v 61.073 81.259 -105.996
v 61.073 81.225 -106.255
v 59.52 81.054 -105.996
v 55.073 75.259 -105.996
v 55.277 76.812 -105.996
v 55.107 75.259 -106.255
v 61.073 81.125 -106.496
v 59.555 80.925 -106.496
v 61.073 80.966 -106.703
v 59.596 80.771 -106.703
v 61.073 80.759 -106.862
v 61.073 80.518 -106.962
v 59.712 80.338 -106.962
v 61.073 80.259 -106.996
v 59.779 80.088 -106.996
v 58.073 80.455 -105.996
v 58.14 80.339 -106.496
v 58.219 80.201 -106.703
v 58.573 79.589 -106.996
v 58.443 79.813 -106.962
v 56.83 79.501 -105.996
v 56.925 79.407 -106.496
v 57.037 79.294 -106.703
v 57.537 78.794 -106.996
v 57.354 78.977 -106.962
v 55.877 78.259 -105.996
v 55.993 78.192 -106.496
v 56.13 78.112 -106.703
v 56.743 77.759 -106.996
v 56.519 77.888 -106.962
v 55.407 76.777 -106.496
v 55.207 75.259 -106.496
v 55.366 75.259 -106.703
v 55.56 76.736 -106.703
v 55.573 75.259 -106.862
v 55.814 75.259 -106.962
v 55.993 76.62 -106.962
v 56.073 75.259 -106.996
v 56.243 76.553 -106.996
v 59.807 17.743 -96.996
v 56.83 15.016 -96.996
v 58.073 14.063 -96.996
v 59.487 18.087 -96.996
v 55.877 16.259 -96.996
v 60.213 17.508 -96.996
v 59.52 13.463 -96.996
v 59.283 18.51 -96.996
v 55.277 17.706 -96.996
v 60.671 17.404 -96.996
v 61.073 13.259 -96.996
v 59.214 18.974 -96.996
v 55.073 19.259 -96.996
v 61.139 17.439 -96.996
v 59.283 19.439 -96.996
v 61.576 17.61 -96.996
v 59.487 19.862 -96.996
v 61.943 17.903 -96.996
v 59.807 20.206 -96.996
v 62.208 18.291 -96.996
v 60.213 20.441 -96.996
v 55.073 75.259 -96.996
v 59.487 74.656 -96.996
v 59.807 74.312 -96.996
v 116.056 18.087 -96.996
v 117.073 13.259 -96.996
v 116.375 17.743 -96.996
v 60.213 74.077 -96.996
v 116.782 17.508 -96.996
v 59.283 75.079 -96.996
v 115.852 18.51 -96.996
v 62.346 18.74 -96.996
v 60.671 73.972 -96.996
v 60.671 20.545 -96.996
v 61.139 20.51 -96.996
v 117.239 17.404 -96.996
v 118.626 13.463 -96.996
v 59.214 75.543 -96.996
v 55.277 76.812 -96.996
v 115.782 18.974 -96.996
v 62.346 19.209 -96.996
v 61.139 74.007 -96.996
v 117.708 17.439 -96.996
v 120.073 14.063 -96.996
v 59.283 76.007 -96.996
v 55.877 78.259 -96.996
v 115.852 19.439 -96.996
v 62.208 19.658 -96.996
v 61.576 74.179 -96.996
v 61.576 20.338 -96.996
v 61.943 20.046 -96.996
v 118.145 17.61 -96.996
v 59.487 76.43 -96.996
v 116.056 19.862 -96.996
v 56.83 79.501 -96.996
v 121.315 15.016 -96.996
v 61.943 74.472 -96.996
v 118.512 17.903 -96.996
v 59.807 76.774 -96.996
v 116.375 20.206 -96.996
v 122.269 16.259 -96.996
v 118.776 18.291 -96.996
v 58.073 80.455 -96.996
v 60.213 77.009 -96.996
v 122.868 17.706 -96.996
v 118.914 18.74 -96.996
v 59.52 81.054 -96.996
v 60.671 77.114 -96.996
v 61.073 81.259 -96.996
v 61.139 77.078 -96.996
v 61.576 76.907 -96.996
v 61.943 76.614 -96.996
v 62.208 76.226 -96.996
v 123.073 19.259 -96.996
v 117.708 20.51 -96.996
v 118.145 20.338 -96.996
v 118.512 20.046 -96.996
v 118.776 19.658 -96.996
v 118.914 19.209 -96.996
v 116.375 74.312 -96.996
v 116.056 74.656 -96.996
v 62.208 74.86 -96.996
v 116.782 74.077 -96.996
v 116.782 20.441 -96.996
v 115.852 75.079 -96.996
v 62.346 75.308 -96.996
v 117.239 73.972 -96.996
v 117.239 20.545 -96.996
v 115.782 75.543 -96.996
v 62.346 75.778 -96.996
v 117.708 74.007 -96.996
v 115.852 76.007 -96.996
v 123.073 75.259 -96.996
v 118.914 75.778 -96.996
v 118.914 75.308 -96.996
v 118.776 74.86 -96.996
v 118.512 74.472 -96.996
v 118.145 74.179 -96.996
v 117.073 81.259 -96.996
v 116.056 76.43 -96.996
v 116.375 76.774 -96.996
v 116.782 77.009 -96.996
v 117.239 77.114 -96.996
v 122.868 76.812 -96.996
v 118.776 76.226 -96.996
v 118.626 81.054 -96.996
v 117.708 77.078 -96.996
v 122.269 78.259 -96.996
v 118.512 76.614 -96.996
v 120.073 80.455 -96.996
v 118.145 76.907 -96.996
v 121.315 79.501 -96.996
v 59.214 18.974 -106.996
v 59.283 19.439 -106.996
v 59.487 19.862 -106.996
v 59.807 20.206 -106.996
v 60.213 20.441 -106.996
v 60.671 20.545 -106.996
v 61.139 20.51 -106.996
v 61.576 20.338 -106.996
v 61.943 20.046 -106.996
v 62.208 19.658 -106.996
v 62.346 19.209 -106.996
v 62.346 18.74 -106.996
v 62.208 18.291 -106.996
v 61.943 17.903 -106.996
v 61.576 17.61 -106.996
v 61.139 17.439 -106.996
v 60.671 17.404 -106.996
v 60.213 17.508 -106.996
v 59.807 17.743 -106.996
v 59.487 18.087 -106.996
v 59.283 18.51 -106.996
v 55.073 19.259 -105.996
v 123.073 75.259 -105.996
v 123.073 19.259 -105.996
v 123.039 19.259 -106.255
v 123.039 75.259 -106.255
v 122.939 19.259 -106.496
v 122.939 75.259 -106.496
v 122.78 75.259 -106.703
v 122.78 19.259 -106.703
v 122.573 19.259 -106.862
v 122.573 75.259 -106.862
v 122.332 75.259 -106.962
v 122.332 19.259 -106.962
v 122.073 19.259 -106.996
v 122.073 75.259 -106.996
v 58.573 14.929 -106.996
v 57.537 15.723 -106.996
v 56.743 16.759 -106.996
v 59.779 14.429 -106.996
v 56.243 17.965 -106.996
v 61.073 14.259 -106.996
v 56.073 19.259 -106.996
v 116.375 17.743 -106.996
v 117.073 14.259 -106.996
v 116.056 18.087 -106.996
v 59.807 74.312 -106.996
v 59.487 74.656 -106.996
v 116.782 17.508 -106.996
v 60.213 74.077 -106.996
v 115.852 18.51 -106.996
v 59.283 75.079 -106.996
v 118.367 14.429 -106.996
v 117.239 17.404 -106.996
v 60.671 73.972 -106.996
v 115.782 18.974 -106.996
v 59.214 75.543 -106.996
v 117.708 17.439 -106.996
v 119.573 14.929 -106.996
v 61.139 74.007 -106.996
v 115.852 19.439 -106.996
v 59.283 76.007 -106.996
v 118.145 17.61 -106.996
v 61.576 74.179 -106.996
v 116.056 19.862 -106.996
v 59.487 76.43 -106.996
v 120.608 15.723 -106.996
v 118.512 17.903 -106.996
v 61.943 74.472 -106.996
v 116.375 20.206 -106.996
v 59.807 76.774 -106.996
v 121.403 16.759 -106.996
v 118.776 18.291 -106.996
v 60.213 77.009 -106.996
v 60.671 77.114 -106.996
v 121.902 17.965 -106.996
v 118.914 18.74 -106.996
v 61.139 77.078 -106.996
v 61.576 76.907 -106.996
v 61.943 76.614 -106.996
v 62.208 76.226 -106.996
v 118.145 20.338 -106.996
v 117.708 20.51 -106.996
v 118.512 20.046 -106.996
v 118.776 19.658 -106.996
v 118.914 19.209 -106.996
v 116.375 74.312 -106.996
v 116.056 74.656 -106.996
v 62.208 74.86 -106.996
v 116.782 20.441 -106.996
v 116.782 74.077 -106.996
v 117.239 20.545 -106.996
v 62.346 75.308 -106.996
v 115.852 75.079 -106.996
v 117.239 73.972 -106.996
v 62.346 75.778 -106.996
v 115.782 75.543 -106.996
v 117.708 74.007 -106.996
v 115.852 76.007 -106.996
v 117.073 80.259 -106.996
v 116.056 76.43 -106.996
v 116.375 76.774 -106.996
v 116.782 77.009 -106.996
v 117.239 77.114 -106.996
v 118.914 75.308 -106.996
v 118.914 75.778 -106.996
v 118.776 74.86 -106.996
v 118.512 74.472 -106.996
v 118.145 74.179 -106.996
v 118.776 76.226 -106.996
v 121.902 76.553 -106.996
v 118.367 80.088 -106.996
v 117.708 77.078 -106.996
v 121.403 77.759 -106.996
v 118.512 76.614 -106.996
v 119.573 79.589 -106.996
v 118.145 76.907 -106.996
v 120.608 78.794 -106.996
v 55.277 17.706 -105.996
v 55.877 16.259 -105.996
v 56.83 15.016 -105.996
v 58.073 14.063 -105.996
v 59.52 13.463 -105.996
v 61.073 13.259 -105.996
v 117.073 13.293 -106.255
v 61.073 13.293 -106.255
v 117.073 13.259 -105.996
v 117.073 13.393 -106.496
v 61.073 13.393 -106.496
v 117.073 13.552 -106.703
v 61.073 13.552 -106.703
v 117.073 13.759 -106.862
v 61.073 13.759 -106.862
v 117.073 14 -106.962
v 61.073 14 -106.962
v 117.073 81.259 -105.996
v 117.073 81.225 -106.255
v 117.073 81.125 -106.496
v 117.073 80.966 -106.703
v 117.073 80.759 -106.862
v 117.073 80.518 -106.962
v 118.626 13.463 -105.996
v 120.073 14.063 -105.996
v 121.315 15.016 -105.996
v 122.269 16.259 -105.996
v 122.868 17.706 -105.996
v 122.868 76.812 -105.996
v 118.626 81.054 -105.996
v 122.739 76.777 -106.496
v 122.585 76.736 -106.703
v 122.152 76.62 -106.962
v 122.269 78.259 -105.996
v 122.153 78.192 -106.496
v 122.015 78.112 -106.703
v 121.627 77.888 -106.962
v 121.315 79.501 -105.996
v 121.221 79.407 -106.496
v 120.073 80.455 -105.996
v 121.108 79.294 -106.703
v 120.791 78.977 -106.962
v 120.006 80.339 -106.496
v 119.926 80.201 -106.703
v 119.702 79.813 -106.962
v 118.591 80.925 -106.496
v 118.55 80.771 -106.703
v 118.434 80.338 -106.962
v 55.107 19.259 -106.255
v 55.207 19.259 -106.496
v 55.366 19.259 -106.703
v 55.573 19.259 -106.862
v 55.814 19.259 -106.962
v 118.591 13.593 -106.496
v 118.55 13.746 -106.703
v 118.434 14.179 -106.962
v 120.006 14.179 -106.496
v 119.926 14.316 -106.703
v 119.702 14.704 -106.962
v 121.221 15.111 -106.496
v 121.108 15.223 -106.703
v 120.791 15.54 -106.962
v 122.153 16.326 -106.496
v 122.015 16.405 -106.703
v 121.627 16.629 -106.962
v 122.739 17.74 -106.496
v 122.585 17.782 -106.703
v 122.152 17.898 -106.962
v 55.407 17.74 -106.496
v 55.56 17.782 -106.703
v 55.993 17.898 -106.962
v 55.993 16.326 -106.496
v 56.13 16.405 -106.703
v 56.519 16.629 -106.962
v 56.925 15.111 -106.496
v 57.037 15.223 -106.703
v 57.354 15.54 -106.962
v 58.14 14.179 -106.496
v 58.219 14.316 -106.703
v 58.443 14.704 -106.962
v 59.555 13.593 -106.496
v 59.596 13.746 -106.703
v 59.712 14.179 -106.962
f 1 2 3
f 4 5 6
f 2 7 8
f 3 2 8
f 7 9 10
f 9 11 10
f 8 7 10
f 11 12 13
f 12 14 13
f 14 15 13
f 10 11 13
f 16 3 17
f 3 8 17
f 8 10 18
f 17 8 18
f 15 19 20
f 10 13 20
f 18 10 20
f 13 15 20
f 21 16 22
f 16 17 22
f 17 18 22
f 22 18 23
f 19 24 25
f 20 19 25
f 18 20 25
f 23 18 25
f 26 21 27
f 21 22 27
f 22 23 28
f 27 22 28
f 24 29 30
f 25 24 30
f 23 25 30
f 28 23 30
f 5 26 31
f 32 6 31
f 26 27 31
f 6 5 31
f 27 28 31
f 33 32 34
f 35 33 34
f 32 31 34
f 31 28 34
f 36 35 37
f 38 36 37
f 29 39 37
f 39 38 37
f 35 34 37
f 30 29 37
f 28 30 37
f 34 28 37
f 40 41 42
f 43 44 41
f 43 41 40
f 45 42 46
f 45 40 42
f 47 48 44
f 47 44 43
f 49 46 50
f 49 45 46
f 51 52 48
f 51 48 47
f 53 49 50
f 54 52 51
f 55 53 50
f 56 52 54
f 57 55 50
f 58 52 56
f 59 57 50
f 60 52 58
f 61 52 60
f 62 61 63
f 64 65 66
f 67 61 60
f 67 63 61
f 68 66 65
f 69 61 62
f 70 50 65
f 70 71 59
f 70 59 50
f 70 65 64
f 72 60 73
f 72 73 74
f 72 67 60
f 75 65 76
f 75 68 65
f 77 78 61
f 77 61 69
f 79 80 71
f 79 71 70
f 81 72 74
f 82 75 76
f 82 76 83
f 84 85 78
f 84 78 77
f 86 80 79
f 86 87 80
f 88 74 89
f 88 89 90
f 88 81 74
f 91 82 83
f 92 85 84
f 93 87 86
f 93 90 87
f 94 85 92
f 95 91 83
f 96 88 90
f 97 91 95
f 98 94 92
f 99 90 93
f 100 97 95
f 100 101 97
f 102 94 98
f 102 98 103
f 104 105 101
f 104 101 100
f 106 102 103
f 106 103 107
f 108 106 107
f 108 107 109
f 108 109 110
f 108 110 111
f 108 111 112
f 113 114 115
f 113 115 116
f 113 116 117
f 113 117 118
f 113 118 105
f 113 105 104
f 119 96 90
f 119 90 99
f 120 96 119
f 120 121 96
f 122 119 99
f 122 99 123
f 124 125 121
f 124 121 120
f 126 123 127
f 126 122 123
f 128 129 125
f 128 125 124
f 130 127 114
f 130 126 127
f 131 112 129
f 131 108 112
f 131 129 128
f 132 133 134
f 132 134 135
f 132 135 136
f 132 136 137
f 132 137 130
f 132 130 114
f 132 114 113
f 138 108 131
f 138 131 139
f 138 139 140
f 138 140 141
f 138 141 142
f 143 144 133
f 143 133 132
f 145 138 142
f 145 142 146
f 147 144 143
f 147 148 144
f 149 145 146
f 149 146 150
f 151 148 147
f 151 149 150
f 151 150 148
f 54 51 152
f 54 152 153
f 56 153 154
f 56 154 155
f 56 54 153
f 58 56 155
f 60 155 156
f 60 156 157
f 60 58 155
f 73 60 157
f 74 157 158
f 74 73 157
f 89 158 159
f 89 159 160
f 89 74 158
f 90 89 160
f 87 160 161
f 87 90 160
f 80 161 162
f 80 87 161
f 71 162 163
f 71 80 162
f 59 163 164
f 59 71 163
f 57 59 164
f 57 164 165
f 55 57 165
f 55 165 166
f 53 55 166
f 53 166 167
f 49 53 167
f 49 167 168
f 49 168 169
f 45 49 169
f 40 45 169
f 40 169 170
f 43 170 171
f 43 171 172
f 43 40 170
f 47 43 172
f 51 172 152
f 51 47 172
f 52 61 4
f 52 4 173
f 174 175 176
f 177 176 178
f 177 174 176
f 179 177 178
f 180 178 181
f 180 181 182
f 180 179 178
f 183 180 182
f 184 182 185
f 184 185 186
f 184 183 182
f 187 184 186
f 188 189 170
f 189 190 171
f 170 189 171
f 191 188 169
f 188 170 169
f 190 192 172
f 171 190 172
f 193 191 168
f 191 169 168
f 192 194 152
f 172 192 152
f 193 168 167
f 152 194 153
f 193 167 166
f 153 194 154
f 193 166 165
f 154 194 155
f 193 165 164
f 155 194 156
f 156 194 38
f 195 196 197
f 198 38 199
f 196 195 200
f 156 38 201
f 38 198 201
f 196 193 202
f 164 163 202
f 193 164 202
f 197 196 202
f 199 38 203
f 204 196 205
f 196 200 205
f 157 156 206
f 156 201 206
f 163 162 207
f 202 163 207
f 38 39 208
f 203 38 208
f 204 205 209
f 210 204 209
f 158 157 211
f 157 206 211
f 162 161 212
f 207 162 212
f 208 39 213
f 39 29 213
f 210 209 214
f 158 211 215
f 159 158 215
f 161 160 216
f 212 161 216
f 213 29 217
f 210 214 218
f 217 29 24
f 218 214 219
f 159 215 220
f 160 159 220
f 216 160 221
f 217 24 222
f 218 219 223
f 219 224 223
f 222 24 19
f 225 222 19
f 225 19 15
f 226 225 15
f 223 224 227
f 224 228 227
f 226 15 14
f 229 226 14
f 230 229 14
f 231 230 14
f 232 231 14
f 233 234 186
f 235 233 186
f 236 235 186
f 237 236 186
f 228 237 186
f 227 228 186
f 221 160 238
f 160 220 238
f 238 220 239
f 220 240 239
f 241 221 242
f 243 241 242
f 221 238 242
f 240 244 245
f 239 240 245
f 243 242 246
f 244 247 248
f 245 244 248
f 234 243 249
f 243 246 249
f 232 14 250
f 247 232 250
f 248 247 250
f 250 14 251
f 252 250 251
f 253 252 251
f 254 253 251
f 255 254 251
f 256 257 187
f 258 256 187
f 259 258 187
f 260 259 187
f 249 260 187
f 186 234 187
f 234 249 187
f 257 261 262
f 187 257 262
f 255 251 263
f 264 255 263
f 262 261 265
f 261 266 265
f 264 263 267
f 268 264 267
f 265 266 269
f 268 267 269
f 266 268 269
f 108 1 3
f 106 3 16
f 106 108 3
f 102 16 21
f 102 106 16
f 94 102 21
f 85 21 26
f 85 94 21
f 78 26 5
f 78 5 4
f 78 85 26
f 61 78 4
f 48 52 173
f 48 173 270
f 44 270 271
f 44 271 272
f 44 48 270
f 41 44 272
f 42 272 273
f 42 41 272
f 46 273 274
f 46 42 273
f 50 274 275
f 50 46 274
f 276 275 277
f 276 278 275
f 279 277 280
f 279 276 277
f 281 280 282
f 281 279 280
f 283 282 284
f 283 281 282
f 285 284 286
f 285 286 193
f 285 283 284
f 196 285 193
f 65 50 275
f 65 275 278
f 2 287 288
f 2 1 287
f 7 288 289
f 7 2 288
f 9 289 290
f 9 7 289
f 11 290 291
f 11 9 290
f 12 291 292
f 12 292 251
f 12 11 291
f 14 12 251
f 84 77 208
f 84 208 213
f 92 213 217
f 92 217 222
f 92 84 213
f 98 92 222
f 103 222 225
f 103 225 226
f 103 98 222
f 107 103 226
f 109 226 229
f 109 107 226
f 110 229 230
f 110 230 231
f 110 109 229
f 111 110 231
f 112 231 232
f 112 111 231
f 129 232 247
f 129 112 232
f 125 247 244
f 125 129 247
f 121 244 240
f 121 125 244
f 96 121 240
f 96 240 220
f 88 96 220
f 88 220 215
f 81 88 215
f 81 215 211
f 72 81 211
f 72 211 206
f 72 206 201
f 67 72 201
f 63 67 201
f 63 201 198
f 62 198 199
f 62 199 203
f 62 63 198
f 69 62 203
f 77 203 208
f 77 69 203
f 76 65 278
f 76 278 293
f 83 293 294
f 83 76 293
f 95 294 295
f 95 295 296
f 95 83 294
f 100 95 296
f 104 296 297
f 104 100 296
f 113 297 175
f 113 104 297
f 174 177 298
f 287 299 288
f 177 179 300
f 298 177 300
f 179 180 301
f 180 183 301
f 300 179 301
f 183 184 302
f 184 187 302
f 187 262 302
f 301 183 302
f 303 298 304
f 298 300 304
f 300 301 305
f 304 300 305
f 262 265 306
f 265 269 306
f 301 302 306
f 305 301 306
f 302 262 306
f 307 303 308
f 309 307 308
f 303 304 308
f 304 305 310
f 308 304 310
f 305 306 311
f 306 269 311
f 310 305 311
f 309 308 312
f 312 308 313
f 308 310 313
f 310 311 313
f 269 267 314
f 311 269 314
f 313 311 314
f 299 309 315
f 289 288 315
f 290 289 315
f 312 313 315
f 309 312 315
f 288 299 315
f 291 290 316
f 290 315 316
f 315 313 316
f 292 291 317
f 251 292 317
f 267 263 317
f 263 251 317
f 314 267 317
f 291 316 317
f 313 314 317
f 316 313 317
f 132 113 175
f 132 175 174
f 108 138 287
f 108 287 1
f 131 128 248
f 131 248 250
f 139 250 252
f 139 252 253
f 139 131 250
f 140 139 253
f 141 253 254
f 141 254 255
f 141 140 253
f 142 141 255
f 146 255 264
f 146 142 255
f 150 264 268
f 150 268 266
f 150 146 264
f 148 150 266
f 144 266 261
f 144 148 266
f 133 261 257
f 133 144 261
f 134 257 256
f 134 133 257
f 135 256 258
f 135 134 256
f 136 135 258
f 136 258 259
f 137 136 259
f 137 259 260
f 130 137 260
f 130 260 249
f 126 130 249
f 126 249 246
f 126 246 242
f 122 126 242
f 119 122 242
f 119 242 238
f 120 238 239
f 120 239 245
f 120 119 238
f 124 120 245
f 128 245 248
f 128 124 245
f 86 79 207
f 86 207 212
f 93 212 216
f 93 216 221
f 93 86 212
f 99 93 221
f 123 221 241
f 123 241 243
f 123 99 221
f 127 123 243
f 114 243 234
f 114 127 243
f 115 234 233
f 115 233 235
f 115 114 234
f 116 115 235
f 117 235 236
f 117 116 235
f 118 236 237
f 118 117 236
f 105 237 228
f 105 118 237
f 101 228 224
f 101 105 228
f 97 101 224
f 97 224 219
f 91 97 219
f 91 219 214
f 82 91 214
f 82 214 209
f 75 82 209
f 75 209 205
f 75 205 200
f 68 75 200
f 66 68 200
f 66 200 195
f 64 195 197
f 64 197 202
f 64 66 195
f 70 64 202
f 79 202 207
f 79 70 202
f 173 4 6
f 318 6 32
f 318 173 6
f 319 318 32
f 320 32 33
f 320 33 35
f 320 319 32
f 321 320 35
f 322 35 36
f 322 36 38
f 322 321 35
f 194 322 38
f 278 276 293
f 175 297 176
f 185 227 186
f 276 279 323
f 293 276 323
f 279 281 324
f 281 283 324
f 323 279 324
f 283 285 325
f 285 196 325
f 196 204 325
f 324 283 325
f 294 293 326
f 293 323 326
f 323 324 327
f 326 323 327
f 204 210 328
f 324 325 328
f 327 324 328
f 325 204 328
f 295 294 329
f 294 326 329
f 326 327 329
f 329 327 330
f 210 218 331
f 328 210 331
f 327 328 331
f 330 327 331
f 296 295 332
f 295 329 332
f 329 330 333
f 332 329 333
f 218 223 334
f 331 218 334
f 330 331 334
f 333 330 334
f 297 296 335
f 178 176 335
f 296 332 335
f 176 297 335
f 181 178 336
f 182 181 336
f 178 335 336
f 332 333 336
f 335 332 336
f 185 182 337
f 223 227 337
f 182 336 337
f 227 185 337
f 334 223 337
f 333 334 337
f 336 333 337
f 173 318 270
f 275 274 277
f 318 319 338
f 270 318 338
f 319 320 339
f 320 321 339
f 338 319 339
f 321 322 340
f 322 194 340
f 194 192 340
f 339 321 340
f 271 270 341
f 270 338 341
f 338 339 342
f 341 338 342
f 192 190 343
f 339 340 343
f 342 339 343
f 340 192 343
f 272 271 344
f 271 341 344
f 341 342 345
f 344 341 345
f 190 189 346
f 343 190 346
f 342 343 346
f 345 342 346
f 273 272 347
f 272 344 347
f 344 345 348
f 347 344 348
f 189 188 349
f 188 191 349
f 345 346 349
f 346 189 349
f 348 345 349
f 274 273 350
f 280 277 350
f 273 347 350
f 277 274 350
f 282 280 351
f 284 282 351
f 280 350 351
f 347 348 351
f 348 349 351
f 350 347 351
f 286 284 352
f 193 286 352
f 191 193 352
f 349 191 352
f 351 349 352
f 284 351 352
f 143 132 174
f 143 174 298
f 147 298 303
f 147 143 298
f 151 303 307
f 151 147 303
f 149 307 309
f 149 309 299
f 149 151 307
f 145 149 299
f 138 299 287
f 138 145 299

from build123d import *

# Parameters (mm, degrees)
SKETCH1_R           = 1.575
BOSS_EXTRUDE1_DEPTH = 10
FILLET1_R           = 1


with BuildPart() as part:
    # Sketch1 → Boss-Extrude1 (new body)
    with BuildSketch(Plane(origin=(0, 0, -96.995840519), x_dir=(-1, 0, 0), z_dir=(0, 0, -1))):
        with BuildLine():
            Line((-61.072792821, 13.25870832), (-117.072792821, 13.25870832))
            ThreePointArc((-117.072792821, 13.25870832), (-121.315433508, 15.016067633), (-123.072792821, 19.25870832))
            Line((-123.072792821, 19.25870832), (-123.072792821, 75.25870832))
            ThreePointArc((-123.072792821, 75.25870832), (-121.315433508, 79.501349008), (-117.072792821, 81.25870832))
            Line((-117.072792821, 81.25870832), (-61.072792821, 81.25870832))
            ThreePointArc((-61.072792821, 81.25870832), (-56.830152134, 79.501349008), (-55.072792821, 75.25870832))
            Line((-55.072792821, 75.25870832), (-55.072792821, 19.25870832))
            ThreePointArc((-55.072792821, 19.25870832), (-56.830152134, 15.016067633), (-61.072792821, 13.25870832))
        make_face()
        with Locations((-117.357064069, 75.542979568)):
            Circle(SKETCH1_R, mode=Mode.SUBTRACT)
        with Locations((-60.788521574, 75.542979568)):
            Circle(SKETCH1_R, mode=Mode.SUBTRACT)
        with Locations((-60.788521574, 18.974437073)):
            Circle(SKETCH1_R, mode=Mode.SUBTRACT)
        with Locations((-117.357064069, 18.974437073)):
            Circle(SKETCH1_R, mode=Mode.SUBTRACT)
    extrude(amount=BOSS_EXTRUDE1_DEPTH)

    # Fillet1
    fillet1_edges = [part.edges().sort_by_distance(p)[0] for p in [
        (56.830152134, 15.016067633, -106.995840519),
        (55.072792821, 47.25870832, -106.995840519),
        (56.830152134, 79.501349008, -106.995840519),
        (89.072792821, 81.25870832, -106.995840519),
        (121.315433508, 79.501349008, -106.995840519),
        (123.072792821, 47.25870832, -106.995840519),
        (121.315433508, 15.016067633, -106.995840519),
        (89.072792821, 13.25870832, -106.995840519),
    ]]
    fillet(fillet1_edges, radius=FILLET1_R)


solid = part.part
